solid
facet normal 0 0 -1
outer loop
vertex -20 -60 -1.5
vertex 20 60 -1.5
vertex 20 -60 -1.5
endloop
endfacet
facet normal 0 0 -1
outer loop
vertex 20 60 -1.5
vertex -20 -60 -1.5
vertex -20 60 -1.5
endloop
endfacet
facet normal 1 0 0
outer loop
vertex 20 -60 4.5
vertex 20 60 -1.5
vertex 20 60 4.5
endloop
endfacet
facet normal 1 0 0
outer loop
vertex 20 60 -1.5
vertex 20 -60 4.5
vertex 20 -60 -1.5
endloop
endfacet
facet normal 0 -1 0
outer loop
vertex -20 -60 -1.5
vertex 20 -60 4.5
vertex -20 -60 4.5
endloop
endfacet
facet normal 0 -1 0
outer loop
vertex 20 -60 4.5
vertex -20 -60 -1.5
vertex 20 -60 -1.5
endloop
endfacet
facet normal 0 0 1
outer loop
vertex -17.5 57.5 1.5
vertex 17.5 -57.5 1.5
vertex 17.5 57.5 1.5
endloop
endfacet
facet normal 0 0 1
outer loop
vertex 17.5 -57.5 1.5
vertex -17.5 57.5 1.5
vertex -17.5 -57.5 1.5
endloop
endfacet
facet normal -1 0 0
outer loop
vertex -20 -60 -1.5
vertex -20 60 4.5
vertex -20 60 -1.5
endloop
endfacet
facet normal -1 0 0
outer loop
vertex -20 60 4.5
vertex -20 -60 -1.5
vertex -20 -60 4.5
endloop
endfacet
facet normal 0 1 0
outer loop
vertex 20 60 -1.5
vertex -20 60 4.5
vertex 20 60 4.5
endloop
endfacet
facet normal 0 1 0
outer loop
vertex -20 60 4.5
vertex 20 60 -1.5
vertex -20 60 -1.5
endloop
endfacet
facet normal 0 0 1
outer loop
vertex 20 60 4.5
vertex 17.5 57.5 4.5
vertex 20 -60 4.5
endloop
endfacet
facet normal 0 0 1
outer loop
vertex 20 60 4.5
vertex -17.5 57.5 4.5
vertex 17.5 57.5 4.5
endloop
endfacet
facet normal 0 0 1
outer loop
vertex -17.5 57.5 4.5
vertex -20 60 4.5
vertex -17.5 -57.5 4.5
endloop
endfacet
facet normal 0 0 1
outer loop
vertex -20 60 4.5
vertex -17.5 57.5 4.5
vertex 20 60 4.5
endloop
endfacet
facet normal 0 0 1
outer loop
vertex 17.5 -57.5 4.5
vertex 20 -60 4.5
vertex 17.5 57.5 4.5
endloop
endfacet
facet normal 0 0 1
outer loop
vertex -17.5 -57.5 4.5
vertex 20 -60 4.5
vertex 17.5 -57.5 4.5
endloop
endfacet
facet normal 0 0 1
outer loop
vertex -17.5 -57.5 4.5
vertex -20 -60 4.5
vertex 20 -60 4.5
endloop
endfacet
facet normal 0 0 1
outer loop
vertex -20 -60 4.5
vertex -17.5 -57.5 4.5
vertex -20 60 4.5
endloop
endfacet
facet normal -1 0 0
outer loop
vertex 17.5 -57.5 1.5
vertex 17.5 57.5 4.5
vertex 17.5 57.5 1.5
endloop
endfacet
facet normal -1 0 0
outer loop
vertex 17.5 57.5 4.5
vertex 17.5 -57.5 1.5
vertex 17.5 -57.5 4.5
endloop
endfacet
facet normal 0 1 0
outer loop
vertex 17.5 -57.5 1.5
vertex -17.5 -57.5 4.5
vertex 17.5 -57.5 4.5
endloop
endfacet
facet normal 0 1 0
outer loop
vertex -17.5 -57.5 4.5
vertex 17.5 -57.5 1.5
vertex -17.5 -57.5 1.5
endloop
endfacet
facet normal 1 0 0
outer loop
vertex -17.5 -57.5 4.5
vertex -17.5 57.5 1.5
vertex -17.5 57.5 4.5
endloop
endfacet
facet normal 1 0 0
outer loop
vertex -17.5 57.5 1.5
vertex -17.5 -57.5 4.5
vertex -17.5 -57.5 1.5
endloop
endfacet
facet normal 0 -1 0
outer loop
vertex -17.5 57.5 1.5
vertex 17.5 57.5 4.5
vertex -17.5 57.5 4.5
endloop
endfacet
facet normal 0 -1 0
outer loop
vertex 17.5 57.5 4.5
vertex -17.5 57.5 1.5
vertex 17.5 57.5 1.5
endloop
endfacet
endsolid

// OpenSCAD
/*
 * Tao Steps Stamp. Two feet, inline.
 */
 echo(version=version());

logo1 = "images/footprint_left.png";
logo2 = "images/footprint_right.png";
logoy = 400; // 343; 
logox = 626; 

module roundedRect(size, radius) {  
	linear_extrude(height=size.z, center=true) {
		offset(radius) offset(-radius) {
			square([size.x, size.y], center = true);
		}
	}
}


// Base plate
// ----------
plateWidth = 40;
plateLength = 120;
plateThickNess = 3;
cornerRadius = 0;
ratio = 0.6;

module oneStep() {
  translate([0, -25, 2]) {
    scale([ratio * ((plateLength / 2) / 1) / logox, 
           ratio * plateWidth / logoy, .02]) {
      color("red") {
        rotate([0, 0, -0]) {
          surface(file=logo1, invert=true, center=true);
        }
      }
    }
  }
  translate([0, 25, 2]) {
    scale([ratio * ((plateLength / 2) / 1) / logox, 
           ratio * plateWidth / logoy, .02]) {
      color("green") {
        rotate([0, 0, -0]) {
          surface(file=logo2, invert=true, center=true);
        }
      }
    }
  }
}

//color("green") {
difference() {  
	union() {
		difference() {
			roundedRect([plateWidth, plateLength, plateThickNess], cornerRadius);
      oneStep();
		}
		// The frame
		translate([0, 0, (plateThickNess / 1)]) {
			difference() {
				roundedRect([plateWidth, plateLength, plateThickNess], cornerRadius);
				roundedRect([plateWidth - 5, plateLength - 5, plateThickNess * 1.1], cornerRadius);
			}
		}
	}
}
//}
